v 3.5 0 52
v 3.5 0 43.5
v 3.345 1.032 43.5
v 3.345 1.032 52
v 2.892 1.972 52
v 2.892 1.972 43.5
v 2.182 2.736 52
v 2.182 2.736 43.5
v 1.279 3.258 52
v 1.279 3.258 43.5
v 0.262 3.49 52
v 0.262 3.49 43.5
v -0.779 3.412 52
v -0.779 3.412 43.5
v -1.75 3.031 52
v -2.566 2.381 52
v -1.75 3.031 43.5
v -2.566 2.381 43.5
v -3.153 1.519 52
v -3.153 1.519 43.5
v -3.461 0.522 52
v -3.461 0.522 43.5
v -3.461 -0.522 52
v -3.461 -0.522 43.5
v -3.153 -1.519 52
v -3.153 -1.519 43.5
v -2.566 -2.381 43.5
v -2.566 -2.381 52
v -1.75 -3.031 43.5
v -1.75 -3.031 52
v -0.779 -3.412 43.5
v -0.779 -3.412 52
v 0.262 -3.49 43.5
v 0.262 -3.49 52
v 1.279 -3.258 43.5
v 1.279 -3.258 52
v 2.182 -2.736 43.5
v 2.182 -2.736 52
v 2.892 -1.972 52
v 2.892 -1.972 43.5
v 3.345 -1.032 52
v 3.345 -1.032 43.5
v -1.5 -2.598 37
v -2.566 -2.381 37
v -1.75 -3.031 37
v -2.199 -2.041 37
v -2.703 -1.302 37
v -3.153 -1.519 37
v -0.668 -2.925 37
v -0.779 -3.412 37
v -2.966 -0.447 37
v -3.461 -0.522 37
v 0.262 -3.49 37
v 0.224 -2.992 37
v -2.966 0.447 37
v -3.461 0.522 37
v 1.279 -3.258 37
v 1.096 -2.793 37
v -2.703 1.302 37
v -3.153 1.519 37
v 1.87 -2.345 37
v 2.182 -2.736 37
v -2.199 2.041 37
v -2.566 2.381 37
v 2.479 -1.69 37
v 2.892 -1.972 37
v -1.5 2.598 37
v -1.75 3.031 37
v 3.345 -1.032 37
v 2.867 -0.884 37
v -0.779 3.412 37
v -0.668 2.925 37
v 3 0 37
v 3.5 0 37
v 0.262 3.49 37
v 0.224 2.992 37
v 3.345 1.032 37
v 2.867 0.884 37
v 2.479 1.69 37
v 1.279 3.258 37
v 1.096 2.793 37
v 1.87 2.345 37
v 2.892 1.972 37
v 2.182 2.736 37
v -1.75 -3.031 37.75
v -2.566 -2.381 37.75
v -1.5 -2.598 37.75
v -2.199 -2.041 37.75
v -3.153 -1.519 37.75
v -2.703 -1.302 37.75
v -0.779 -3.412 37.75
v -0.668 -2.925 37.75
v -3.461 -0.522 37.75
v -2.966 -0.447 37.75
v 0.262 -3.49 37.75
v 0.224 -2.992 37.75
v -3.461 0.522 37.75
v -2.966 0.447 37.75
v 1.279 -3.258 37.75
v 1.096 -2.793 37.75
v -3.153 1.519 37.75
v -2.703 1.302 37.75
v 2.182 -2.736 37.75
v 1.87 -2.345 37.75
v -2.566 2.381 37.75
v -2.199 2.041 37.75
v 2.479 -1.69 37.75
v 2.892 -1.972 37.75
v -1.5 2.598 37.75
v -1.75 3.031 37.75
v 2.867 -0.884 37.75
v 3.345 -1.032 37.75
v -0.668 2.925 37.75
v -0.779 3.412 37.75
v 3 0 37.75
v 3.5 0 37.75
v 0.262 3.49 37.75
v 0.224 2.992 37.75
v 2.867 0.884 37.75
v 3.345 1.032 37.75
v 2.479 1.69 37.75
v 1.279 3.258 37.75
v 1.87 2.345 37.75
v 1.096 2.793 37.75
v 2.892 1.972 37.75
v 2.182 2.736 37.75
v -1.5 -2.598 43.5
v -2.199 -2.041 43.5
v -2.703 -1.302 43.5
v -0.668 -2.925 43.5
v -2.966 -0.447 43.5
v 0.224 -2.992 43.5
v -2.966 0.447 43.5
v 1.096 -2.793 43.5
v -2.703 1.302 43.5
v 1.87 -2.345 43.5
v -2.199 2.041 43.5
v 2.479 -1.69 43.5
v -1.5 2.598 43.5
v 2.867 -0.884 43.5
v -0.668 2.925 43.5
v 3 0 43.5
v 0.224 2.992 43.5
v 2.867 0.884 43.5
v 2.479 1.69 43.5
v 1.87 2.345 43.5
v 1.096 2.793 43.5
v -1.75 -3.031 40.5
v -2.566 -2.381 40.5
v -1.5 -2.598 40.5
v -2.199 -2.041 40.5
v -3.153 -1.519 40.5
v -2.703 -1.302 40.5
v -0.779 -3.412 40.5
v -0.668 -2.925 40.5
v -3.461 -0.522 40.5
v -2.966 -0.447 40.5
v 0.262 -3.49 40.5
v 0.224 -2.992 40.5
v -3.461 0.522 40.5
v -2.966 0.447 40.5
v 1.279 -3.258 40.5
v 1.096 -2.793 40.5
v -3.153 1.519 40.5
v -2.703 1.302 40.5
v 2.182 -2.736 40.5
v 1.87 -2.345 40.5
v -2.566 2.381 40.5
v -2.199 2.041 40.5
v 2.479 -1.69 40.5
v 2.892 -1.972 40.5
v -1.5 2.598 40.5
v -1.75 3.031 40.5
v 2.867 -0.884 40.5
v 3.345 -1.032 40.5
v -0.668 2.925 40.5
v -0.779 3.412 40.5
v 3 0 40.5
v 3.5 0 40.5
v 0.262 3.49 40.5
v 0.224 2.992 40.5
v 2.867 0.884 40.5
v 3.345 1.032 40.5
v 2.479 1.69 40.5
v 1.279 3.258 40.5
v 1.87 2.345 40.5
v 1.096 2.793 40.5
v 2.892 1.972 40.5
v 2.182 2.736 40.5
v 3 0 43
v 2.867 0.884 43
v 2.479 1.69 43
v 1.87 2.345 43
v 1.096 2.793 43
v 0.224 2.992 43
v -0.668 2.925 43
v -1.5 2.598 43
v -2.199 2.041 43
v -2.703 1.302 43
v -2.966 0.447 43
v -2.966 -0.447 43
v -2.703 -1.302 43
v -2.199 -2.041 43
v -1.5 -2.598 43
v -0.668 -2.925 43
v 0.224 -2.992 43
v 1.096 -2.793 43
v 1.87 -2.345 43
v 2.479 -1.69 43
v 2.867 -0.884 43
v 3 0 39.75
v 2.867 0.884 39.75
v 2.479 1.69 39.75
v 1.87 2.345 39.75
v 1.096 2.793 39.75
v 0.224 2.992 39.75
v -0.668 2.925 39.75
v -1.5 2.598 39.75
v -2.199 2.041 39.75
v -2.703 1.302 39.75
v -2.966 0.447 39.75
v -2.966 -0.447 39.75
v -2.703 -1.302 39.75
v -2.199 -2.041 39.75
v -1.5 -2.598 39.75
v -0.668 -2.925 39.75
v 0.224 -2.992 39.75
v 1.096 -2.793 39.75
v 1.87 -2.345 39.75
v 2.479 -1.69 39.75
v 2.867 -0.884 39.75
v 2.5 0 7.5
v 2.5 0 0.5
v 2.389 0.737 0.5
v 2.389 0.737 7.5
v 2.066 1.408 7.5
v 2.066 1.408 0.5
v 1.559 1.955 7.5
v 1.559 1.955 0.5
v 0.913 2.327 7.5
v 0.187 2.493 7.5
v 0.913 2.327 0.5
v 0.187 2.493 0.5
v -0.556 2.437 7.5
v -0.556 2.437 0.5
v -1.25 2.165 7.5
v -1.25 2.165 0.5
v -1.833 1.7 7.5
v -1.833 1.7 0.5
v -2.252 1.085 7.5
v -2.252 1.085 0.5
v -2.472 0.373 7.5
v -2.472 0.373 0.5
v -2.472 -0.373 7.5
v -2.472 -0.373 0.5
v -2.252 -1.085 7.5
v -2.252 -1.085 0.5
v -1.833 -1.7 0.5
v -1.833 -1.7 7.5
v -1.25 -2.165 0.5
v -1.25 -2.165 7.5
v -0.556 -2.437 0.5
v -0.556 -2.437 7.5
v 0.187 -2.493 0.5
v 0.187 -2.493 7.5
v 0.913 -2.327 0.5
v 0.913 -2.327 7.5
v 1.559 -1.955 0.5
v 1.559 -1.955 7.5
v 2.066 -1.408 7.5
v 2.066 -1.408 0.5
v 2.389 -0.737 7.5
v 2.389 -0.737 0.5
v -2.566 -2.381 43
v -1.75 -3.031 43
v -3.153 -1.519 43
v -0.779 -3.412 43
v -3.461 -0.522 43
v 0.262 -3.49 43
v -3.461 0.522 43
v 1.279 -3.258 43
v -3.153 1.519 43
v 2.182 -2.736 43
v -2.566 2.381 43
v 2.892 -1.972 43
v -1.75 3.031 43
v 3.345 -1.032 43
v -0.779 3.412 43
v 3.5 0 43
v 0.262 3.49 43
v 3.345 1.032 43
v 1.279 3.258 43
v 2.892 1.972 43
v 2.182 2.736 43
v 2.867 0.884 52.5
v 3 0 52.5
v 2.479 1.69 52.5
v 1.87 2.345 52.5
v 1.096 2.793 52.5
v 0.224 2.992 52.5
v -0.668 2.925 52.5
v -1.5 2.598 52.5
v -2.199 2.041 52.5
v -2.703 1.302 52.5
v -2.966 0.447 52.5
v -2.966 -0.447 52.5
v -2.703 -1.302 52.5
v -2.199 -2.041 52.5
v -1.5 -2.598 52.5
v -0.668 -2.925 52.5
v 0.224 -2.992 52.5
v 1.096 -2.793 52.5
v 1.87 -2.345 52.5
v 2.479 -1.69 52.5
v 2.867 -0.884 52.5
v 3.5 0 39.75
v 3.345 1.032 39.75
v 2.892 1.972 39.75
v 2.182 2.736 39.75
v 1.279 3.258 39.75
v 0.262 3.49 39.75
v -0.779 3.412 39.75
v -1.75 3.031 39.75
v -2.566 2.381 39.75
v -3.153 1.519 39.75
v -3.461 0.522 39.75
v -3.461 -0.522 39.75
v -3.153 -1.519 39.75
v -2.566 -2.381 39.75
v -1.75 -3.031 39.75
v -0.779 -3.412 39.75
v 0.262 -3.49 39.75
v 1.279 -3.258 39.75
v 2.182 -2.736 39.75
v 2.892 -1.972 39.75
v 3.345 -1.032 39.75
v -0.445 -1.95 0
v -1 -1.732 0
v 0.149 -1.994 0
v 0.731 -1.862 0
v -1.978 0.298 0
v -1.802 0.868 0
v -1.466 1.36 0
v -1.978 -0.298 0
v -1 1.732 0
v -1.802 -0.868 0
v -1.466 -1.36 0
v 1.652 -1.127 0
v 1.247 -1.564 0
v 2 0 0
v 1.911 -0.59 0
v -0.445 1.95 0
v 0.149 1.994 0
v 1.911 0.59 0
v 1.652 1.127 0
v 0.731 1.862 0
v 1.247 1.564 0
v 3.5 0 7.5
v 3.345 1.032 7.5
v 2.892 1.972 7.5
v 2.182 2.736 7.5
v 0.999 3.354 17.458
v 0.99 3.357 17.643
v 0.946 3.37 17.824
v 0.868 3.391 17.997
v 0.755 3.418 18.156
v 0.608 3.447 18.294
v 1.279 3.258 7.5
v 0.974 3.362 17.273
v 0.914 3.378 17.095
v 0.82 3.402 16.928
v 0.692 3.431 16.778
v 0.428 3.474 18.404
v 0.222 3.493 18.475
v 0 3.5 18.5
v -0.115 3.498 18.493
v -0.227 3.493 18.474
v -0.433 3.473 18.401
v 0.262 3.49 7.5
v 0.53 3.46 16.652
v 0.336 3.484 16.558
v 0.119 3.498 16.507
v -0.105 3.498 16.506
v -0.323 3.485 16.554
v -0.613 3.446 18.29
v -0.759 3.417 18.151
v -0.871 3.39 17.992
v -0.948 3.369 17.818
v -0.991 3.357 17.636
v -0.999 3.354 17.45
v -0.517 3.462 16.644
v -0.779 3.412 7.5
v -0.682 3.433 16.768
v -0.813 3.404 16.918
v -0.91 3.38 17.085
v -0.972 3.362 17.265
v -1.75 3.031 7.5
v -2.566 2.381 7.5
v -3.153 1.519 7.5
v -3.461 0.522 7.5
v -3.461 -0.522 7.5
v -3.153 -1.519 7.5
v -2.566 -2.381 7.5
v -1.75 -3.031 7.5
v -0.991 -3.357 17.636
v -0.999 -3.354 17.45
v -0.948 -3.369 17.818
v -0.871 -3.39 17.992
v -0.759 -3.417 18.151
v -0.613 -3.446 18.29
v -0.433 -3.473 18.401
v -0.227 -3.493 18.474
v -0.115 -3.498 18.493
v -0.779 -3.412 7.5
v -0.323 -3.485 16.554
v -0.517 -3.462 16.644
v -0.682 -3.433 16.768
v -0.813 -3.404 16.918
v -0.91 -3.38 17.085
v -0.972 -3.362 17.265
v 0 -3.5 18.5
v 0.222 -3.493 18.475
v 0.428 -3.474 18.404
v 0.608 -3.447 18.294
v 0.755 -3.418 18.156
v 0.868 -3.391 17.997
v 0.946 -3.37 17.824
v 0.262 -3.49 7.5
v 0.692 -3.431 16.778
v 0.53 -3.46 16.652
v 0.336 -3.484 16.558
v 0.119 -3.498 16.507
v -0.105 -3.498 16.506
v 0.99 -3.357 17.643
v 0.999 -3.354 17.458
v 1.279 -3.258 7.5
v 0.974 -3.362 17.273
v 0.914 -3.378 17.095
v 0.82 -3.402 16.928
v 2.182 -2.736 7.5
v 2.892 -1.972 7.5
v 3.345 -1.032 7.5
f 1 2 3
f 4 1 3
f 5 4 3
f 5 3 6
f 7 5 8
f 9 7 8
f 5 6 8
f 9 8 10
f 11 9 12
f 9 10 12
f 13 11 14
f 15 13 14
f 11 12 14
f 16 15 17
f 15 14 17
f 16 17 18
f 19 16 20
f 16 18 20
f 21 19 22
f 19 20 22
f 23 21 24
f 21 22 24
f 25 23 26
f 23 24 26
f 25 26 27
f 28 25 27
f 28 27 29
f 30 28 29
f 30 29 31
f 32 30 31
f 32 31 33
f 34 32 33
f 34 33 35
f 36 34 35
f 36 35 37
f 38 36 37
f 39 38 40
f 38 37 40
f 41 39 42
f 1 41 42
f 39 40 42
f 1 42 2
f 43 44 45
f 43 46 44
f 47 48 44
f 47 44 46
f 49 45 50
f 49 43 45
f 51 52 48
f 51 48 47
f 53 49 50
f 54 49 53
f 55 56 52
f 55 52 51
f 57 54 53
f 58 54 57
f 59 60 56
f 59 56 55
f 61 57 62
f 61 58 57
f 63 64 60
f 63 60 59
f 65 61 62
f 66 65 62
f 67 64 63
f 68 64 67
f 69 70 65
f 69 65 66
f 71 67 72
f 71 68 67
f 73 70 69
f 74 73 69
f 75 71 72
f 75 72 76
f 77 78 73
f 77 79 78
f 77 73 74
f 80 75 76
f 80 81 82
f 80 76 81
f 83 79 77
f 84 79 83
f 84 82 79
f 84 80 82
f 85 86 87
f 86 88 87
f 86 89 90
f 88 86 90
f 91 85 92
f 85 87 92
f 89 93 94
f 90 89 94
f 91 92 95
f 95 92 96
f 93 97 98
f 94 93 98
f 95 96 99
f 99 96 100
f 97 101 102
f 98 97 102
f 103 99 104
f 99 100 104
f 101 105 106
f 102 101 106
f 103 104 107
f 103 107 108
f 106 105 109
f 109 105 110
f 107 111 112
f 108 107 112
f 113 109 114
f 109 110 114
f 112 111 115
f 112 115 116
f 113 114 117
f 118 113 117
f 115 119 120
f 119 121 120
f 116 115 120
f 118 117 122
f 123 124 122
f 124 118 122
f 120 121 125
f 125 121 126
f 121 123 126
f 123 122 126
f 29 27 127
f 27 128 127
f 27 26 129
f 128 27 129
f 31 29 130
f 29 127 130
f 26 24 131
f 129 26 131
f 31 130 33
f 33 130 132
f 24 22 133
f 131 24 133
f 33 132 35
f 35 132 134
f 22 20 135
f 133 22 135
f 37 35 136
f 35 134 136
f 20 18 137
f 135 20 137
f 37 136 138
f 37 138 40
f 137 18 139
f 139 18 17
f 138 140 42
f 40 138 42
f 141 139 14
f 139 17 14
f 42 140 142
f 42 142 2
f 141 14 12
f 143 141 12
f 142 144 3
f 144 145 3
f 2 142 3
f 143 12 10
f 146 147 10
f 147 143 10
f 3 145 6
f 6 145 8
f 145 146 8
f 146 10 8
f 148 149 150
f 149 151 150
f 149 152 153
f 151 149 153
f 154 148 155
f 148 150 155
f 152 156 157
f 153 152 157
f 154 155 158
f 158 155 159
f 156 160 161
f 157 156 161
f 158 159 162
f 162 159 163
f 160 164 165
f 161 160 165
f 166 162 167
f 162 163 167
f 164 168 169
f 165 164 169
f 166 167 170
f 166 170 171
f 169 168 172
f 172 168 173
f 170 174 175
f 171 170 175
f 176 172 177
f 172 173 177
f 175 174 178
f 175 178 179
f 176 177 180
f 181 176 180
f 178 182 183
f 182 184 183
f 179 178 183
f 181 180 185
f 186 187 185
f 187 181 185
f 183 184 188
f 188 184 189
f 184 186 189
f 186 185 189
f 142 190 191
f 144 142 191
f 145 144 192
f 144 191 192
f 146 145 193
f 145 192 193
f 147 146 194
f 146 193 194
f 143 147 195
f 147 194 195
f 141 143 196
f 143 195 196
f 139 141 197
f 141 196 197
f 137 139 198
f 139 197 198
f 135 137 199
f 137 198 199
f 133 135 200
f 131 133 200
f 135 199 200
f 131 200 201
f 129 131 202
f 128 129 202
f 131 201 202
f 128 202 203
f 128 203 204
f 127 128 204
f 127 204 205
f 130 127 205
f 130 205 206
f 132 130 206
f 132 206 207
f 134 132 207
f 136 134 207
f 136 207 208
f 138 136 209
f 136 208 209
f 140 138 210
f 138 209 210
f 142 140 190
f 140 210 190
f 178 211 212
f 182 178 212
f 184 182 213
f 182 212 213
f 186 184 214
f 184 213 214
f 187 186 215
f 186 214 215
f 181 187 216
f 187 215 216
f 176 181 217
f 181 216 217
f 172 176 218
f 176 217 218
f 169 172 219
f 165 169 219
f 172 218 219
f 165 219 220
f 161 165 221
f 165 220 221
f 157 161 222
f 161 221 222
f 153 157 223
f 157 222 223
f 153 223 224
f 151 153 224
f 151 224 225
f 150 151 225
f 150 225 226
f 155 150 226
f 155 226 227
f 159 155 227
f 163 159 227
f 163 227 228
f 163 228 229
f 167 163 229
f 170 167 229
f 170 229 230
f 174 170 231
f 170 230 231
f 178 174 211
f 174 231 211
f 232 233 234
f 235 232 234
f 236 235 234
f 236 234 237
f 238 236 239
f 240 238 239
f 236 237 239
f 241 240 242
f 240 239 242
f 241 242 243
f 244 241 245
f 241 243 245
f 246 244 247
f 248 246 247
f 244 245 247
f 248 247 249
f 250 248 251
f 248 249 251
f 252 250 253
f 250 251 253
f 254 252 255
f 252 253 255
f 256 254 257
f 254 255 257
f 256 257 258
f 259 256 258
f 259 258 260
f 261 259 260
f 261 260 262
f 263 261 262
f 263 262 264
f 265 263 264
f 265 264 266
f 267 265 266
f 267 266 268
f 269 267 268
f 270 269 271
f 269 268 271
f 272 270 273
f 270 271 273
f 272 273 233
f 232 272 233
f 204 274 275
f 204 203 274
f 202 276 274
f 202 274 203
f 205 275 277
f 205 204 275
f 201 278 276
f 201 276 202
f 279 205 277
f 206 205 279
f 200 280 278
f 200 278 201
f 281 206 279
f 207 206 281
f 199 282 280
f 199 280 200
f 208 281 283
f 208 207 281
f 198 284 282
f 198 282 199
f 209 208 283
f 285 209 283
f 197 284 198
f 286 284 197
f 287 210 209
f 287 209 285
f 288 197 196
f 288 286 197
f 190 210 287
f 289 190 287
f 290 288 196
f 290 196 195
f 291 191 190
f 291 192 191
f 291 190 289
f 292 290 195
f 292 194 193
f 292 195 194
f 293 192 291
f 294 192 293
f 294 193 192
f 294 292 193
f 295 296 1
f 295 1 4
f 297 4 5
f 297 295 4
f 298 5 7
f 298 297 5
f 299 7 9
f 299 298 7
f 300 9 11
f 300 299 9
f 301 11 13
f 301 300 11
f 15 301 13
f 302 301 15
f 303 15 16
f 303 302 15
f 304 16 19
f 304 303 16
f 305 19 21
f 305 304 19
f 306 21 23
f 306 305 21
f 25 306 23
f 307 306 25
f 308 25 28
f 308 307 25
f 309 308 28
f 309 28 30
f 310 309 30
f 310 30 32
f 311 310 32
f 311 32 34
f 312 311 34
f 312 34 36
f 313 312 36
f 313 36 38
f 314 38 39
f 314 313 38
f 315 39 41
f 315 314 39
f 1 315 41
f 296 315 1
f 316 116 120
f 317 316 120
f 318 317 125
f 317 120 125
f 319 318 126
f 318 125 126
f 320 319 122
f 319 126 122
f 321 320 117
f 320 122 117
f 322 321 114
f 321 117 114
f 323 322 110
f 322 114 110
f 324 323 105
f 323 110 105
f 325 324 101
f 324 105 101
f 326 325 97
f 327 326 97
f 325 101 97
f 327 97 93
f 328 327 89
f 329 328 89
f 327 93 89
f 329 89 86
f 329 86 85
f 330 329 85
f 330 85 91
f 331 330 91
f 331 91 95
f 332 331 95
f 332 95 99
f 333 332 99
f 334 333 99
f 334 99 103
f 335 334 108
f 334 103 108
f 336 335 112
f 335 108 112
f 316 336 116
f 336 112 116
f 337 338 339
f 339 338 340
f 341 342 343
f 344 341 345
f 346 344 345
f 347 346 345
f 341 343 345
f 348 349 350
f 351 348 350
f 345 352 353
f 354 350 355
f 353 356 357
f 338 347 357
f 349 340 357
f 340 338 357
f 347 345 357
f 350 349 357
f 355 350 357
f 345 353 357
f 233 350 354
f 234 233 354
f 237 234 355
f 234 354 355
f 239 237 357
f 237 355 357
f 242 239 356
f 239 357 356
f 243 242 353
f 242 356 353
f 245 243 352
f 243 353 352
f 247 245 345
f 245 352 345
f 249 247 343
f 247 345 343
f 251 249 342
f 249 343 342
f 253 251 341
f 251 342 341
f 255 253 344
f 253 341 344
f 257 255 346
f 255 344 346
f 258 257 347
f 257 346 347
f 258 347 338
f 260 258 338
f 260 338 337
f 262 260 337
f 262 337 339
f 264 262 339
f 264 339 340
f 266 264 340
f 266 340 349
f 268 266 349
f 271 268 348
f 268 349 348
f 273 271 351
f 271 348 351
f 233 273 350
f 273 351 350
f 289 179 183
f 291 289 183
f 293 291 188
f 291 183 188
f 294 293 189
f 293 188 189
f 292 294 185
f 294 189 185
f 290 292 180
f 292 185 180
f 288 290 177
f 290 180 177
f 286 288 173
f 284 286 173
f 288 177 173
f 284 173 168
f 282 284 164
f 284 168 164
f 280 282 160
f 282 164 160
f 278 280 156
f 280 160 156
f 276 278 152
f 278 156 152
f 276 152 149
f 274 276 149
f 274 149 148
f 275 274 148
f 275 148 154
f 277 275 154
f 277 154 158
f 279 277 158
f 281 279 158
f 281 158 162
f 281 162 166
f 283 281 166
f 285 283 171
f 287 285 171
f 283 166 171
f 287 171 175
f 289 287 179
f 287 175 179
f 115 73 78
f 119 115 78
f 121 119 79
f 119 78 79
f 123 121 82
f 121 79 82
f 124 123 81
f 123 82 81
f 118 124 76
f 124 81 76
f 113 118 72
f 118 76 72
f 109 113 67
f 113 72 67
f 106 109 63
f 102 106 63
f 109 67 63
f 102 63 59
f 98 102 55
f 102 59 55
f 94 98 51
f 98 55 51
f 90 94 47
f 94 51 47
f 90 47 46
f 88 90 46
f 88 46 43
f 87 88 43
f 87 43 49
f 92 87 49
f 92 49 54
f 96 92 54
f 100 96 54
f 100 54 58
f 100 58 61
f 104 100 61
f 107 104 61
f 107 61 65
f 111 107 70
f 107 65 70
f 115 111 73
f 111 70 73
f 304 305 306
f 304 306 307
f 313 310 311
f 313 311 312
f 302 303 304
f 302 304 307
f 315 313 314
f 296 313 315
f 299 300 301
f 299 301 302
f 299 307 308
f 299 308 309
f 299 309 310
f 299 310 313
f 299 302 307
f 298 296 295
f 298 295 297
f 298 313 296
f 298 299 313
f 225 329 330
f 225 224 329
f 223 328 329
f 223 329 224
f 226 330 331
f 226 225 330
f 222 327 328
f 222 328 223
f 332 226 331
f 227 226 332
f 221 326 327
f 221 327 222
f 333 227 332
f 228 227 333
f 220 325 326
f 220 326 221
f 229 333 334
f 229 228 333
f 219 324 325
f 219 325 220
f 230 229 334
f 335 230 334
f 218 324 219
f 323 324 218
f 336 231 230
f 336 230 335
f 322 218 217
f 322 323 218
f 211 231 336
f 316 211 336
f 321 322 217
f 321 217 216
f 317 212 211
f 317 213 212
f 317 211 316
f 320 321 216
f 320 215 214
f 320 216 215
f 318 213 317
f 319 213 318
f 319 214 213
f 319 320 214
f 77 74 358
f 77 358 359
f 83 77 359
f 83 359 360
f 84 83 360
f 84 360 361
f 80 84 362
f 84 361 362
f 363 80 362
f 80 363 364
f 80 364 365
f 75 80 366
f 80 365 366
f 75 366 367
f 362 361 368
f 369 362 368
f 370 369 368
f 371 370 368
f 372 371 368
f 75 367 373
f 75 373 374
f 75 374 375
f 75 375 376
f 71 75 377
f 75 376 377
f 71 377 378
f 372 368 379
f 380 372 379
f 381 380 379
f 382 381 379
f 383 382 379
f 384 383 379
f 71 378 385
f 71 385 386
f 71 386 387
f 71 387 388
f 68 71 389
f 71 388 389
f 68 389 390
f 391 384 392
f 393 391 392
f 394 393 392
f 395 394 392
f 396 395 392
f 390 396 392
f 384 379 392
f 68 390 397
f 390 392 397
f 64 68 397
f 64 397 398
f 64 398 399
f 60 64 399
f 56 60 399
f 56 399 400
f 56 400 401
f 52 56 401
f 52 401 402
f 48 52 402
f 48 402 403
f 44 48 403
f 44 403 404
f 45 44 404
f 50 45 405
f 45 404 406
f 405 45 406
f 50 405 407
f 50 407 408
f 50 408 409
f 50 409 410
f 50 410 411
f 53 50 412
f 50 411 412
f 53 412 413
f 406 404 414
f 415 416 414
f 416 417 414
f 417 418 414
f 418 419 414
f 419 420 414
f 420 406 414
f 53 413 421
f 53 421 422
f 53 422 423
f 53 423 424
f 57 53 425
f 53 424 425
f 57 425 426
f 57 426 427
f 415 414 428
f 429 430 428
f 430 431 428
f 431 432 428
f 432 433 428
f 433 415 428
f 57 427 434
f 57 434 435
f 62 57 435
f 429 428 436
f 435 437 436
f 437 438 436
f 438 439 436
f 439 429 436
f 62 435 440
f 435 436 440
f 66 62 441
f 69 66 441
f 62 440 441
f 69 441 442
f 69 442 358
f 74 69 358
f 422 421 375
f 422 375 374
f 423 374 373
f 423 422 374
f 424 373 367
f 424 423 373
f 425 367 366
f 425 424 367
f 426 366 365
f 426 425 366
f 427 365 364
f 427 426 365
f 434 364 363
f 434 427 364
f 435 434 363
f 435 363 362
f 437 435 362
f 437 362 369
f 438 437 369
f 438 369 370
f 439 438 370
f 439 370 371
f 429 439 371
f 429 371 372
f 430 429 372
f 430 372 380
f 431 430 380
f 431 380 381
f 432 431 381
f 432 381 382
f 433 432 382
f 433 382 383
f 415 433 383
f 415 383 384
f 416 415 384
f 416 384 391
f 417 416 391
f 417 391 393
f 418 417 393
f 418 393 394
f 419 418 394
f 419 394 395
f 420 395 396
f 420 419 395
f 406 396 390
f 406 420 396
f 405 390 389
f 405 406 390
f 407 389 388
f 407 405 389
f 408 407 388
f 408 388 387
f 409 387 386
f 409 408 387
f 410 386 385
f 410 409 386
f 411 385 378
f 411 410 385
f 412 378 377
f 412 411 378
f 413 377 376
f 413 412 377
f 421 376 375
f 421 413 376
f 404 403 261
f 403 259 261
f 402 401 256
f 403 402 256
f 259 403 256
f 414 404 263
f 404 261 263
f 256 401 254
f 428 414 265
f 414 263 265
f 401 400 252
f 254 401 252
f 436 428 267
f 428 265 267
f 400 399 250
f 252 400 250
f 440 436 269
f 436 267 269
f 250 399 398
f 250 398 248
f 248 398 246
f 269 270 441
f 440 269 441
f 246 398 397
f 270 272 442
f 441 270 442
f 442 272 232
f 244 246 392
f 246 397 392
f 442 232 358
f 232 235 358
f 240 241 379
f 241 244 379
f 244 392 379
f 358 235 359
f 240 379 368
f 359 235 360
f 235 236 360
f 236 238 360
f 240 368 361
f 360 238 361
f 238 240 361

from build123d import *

# Parameters (mm, degrees)
ESQUISSE1_R                  = 2.5
BOSS_EXTRU_1_DEPTH           = 7.5
ESQUISSE2_R                  = 3.5
BOSS_EXTRU_2_DEPTH           = 29.5
ESQUISSE3_R                  = 3
BOSS_EXTRU_3_DEPTH           = 0.75
ESQUISSE4_R                  = 3.5
BOSS_EXTRU_4_DEPTH           = 2
ESQUISSE5_R                  = 3
BOSS_EXTRU_5_DEPTH           = 0.75
ESQUISSE6_R                  = 3.5
BOSS_EXTRU_6_DEPTH           = 2.5
ESQUISSE7_R                  = 3
BOSS_EXTRU_7_DEPTH           = 0.5
ESQUISSE8_R                  = 3.5
BOSS_EXTRU_8_DEPTH           = 9
CHANFREIN2_SIZE              = 0.5
ENL_V_MAT_EXTRU_1_DEPTH      = 53.732817107
ENL_V_MAT_EXTRU_1_DEPTH_BACK = 53.732817107
ESQUISSE9_R                  = 1


with BuildPart() as part:
    # Esquisse1 → Boss.-Extru.1 (new body)
    with BuildSketch(Plane.XY):
        Circle(ESQUISSE1_R)
    extrude(amount=BOSS_EXTRU_1_DEPTH)

    # Esquisse2 → Boss.-Extru.2 (add)
    with BuildSketch(Plane.XY.offset(7.5)):
        Circle(ESQUISSE2_R)
    extrude(amount=BOSS_EXTRU_2_DEPTH)

    # Esquisse3 → Boss.-Extru.3 (add)
    with BuildSketch(Plane.XY.offset(37)):
        Circle(ESQUISSE3_R)
    extrude(amount=BOSS_EXTRU_3_DEPTH)

    # Esquisse4 → Boss.-Extru.4 (add)
    with BuildSketch(Plane.XY.offset(37.75)):
        Circle(ESQUISSE4_R)
    extrude(amount=BOSS_EXTRU_4_DEPTH)

    # Esquisse5 → Boss.-Extru.5 (add)
    with BuildSketch(Plane.XY.offset(39.75)):
        Circle(ESQUISSE5_R)
    extrude(amount=BOSS_EXTRU_5_DEPTH)

    # Esquisse6 → Boss.-Extru.6 (add)
    with BuildSketch(Plane.XY.offset(40.5)):
        Circle(ESQUISSE6_R)
    extrude(amount=BOSS_EXTRU_6_DEPTH)

    # Esquisse7 → Boss.-Extru.7 (add)
    with BuildSketch(Plane.XY.offset(43)):
        Circle(ESQUISSE7_R)
    extrude(amount=BOSS_EXTRU_7_DEPTH)

    # Esquisse8 → Boss.-Extru.8 (add)
    with BuildSketch(Plane.XY.offset(43.5)):
        Circle(ESQUISSE8_R)
    extrude(amount=BOSS_EXTRU_8_DEPTH)

    # Chanfrein2
    chanfrein2_edges = [part.edges().sort_by_distance(p)[0] for p in [
        (-2.5, 0, 0),
        (-3.5, 0, 52.5),
    ]]
    chamfer(chanfrein2_edges, length=CHANFREIN2_SIZE)

    # Esquisse9 → Enlèv. mat.-Extru.1 (cut, two sides: drawn at the far end of the back side and taken through both)
    with BuildSketch(Plane(origin=(0, 0, 0), x_dir=(1, 0, 0), z_dir=(0, 1, 0)).offset(-ENL_V_MAT_EXTRU_1_DEPTH_BACK)):
        with Locations(Location((0, -17.5, 0), (0, 0, 270))):
            Circle(ESQUISSE9_R)
    extrude(amount=ENL_V_MAT_EXTRU_1_DEPTH + ENL_V_MAT_EXTRU_1_DEPTH_BACK, mode=Mode.SUBTRACT)


solid = part.part
